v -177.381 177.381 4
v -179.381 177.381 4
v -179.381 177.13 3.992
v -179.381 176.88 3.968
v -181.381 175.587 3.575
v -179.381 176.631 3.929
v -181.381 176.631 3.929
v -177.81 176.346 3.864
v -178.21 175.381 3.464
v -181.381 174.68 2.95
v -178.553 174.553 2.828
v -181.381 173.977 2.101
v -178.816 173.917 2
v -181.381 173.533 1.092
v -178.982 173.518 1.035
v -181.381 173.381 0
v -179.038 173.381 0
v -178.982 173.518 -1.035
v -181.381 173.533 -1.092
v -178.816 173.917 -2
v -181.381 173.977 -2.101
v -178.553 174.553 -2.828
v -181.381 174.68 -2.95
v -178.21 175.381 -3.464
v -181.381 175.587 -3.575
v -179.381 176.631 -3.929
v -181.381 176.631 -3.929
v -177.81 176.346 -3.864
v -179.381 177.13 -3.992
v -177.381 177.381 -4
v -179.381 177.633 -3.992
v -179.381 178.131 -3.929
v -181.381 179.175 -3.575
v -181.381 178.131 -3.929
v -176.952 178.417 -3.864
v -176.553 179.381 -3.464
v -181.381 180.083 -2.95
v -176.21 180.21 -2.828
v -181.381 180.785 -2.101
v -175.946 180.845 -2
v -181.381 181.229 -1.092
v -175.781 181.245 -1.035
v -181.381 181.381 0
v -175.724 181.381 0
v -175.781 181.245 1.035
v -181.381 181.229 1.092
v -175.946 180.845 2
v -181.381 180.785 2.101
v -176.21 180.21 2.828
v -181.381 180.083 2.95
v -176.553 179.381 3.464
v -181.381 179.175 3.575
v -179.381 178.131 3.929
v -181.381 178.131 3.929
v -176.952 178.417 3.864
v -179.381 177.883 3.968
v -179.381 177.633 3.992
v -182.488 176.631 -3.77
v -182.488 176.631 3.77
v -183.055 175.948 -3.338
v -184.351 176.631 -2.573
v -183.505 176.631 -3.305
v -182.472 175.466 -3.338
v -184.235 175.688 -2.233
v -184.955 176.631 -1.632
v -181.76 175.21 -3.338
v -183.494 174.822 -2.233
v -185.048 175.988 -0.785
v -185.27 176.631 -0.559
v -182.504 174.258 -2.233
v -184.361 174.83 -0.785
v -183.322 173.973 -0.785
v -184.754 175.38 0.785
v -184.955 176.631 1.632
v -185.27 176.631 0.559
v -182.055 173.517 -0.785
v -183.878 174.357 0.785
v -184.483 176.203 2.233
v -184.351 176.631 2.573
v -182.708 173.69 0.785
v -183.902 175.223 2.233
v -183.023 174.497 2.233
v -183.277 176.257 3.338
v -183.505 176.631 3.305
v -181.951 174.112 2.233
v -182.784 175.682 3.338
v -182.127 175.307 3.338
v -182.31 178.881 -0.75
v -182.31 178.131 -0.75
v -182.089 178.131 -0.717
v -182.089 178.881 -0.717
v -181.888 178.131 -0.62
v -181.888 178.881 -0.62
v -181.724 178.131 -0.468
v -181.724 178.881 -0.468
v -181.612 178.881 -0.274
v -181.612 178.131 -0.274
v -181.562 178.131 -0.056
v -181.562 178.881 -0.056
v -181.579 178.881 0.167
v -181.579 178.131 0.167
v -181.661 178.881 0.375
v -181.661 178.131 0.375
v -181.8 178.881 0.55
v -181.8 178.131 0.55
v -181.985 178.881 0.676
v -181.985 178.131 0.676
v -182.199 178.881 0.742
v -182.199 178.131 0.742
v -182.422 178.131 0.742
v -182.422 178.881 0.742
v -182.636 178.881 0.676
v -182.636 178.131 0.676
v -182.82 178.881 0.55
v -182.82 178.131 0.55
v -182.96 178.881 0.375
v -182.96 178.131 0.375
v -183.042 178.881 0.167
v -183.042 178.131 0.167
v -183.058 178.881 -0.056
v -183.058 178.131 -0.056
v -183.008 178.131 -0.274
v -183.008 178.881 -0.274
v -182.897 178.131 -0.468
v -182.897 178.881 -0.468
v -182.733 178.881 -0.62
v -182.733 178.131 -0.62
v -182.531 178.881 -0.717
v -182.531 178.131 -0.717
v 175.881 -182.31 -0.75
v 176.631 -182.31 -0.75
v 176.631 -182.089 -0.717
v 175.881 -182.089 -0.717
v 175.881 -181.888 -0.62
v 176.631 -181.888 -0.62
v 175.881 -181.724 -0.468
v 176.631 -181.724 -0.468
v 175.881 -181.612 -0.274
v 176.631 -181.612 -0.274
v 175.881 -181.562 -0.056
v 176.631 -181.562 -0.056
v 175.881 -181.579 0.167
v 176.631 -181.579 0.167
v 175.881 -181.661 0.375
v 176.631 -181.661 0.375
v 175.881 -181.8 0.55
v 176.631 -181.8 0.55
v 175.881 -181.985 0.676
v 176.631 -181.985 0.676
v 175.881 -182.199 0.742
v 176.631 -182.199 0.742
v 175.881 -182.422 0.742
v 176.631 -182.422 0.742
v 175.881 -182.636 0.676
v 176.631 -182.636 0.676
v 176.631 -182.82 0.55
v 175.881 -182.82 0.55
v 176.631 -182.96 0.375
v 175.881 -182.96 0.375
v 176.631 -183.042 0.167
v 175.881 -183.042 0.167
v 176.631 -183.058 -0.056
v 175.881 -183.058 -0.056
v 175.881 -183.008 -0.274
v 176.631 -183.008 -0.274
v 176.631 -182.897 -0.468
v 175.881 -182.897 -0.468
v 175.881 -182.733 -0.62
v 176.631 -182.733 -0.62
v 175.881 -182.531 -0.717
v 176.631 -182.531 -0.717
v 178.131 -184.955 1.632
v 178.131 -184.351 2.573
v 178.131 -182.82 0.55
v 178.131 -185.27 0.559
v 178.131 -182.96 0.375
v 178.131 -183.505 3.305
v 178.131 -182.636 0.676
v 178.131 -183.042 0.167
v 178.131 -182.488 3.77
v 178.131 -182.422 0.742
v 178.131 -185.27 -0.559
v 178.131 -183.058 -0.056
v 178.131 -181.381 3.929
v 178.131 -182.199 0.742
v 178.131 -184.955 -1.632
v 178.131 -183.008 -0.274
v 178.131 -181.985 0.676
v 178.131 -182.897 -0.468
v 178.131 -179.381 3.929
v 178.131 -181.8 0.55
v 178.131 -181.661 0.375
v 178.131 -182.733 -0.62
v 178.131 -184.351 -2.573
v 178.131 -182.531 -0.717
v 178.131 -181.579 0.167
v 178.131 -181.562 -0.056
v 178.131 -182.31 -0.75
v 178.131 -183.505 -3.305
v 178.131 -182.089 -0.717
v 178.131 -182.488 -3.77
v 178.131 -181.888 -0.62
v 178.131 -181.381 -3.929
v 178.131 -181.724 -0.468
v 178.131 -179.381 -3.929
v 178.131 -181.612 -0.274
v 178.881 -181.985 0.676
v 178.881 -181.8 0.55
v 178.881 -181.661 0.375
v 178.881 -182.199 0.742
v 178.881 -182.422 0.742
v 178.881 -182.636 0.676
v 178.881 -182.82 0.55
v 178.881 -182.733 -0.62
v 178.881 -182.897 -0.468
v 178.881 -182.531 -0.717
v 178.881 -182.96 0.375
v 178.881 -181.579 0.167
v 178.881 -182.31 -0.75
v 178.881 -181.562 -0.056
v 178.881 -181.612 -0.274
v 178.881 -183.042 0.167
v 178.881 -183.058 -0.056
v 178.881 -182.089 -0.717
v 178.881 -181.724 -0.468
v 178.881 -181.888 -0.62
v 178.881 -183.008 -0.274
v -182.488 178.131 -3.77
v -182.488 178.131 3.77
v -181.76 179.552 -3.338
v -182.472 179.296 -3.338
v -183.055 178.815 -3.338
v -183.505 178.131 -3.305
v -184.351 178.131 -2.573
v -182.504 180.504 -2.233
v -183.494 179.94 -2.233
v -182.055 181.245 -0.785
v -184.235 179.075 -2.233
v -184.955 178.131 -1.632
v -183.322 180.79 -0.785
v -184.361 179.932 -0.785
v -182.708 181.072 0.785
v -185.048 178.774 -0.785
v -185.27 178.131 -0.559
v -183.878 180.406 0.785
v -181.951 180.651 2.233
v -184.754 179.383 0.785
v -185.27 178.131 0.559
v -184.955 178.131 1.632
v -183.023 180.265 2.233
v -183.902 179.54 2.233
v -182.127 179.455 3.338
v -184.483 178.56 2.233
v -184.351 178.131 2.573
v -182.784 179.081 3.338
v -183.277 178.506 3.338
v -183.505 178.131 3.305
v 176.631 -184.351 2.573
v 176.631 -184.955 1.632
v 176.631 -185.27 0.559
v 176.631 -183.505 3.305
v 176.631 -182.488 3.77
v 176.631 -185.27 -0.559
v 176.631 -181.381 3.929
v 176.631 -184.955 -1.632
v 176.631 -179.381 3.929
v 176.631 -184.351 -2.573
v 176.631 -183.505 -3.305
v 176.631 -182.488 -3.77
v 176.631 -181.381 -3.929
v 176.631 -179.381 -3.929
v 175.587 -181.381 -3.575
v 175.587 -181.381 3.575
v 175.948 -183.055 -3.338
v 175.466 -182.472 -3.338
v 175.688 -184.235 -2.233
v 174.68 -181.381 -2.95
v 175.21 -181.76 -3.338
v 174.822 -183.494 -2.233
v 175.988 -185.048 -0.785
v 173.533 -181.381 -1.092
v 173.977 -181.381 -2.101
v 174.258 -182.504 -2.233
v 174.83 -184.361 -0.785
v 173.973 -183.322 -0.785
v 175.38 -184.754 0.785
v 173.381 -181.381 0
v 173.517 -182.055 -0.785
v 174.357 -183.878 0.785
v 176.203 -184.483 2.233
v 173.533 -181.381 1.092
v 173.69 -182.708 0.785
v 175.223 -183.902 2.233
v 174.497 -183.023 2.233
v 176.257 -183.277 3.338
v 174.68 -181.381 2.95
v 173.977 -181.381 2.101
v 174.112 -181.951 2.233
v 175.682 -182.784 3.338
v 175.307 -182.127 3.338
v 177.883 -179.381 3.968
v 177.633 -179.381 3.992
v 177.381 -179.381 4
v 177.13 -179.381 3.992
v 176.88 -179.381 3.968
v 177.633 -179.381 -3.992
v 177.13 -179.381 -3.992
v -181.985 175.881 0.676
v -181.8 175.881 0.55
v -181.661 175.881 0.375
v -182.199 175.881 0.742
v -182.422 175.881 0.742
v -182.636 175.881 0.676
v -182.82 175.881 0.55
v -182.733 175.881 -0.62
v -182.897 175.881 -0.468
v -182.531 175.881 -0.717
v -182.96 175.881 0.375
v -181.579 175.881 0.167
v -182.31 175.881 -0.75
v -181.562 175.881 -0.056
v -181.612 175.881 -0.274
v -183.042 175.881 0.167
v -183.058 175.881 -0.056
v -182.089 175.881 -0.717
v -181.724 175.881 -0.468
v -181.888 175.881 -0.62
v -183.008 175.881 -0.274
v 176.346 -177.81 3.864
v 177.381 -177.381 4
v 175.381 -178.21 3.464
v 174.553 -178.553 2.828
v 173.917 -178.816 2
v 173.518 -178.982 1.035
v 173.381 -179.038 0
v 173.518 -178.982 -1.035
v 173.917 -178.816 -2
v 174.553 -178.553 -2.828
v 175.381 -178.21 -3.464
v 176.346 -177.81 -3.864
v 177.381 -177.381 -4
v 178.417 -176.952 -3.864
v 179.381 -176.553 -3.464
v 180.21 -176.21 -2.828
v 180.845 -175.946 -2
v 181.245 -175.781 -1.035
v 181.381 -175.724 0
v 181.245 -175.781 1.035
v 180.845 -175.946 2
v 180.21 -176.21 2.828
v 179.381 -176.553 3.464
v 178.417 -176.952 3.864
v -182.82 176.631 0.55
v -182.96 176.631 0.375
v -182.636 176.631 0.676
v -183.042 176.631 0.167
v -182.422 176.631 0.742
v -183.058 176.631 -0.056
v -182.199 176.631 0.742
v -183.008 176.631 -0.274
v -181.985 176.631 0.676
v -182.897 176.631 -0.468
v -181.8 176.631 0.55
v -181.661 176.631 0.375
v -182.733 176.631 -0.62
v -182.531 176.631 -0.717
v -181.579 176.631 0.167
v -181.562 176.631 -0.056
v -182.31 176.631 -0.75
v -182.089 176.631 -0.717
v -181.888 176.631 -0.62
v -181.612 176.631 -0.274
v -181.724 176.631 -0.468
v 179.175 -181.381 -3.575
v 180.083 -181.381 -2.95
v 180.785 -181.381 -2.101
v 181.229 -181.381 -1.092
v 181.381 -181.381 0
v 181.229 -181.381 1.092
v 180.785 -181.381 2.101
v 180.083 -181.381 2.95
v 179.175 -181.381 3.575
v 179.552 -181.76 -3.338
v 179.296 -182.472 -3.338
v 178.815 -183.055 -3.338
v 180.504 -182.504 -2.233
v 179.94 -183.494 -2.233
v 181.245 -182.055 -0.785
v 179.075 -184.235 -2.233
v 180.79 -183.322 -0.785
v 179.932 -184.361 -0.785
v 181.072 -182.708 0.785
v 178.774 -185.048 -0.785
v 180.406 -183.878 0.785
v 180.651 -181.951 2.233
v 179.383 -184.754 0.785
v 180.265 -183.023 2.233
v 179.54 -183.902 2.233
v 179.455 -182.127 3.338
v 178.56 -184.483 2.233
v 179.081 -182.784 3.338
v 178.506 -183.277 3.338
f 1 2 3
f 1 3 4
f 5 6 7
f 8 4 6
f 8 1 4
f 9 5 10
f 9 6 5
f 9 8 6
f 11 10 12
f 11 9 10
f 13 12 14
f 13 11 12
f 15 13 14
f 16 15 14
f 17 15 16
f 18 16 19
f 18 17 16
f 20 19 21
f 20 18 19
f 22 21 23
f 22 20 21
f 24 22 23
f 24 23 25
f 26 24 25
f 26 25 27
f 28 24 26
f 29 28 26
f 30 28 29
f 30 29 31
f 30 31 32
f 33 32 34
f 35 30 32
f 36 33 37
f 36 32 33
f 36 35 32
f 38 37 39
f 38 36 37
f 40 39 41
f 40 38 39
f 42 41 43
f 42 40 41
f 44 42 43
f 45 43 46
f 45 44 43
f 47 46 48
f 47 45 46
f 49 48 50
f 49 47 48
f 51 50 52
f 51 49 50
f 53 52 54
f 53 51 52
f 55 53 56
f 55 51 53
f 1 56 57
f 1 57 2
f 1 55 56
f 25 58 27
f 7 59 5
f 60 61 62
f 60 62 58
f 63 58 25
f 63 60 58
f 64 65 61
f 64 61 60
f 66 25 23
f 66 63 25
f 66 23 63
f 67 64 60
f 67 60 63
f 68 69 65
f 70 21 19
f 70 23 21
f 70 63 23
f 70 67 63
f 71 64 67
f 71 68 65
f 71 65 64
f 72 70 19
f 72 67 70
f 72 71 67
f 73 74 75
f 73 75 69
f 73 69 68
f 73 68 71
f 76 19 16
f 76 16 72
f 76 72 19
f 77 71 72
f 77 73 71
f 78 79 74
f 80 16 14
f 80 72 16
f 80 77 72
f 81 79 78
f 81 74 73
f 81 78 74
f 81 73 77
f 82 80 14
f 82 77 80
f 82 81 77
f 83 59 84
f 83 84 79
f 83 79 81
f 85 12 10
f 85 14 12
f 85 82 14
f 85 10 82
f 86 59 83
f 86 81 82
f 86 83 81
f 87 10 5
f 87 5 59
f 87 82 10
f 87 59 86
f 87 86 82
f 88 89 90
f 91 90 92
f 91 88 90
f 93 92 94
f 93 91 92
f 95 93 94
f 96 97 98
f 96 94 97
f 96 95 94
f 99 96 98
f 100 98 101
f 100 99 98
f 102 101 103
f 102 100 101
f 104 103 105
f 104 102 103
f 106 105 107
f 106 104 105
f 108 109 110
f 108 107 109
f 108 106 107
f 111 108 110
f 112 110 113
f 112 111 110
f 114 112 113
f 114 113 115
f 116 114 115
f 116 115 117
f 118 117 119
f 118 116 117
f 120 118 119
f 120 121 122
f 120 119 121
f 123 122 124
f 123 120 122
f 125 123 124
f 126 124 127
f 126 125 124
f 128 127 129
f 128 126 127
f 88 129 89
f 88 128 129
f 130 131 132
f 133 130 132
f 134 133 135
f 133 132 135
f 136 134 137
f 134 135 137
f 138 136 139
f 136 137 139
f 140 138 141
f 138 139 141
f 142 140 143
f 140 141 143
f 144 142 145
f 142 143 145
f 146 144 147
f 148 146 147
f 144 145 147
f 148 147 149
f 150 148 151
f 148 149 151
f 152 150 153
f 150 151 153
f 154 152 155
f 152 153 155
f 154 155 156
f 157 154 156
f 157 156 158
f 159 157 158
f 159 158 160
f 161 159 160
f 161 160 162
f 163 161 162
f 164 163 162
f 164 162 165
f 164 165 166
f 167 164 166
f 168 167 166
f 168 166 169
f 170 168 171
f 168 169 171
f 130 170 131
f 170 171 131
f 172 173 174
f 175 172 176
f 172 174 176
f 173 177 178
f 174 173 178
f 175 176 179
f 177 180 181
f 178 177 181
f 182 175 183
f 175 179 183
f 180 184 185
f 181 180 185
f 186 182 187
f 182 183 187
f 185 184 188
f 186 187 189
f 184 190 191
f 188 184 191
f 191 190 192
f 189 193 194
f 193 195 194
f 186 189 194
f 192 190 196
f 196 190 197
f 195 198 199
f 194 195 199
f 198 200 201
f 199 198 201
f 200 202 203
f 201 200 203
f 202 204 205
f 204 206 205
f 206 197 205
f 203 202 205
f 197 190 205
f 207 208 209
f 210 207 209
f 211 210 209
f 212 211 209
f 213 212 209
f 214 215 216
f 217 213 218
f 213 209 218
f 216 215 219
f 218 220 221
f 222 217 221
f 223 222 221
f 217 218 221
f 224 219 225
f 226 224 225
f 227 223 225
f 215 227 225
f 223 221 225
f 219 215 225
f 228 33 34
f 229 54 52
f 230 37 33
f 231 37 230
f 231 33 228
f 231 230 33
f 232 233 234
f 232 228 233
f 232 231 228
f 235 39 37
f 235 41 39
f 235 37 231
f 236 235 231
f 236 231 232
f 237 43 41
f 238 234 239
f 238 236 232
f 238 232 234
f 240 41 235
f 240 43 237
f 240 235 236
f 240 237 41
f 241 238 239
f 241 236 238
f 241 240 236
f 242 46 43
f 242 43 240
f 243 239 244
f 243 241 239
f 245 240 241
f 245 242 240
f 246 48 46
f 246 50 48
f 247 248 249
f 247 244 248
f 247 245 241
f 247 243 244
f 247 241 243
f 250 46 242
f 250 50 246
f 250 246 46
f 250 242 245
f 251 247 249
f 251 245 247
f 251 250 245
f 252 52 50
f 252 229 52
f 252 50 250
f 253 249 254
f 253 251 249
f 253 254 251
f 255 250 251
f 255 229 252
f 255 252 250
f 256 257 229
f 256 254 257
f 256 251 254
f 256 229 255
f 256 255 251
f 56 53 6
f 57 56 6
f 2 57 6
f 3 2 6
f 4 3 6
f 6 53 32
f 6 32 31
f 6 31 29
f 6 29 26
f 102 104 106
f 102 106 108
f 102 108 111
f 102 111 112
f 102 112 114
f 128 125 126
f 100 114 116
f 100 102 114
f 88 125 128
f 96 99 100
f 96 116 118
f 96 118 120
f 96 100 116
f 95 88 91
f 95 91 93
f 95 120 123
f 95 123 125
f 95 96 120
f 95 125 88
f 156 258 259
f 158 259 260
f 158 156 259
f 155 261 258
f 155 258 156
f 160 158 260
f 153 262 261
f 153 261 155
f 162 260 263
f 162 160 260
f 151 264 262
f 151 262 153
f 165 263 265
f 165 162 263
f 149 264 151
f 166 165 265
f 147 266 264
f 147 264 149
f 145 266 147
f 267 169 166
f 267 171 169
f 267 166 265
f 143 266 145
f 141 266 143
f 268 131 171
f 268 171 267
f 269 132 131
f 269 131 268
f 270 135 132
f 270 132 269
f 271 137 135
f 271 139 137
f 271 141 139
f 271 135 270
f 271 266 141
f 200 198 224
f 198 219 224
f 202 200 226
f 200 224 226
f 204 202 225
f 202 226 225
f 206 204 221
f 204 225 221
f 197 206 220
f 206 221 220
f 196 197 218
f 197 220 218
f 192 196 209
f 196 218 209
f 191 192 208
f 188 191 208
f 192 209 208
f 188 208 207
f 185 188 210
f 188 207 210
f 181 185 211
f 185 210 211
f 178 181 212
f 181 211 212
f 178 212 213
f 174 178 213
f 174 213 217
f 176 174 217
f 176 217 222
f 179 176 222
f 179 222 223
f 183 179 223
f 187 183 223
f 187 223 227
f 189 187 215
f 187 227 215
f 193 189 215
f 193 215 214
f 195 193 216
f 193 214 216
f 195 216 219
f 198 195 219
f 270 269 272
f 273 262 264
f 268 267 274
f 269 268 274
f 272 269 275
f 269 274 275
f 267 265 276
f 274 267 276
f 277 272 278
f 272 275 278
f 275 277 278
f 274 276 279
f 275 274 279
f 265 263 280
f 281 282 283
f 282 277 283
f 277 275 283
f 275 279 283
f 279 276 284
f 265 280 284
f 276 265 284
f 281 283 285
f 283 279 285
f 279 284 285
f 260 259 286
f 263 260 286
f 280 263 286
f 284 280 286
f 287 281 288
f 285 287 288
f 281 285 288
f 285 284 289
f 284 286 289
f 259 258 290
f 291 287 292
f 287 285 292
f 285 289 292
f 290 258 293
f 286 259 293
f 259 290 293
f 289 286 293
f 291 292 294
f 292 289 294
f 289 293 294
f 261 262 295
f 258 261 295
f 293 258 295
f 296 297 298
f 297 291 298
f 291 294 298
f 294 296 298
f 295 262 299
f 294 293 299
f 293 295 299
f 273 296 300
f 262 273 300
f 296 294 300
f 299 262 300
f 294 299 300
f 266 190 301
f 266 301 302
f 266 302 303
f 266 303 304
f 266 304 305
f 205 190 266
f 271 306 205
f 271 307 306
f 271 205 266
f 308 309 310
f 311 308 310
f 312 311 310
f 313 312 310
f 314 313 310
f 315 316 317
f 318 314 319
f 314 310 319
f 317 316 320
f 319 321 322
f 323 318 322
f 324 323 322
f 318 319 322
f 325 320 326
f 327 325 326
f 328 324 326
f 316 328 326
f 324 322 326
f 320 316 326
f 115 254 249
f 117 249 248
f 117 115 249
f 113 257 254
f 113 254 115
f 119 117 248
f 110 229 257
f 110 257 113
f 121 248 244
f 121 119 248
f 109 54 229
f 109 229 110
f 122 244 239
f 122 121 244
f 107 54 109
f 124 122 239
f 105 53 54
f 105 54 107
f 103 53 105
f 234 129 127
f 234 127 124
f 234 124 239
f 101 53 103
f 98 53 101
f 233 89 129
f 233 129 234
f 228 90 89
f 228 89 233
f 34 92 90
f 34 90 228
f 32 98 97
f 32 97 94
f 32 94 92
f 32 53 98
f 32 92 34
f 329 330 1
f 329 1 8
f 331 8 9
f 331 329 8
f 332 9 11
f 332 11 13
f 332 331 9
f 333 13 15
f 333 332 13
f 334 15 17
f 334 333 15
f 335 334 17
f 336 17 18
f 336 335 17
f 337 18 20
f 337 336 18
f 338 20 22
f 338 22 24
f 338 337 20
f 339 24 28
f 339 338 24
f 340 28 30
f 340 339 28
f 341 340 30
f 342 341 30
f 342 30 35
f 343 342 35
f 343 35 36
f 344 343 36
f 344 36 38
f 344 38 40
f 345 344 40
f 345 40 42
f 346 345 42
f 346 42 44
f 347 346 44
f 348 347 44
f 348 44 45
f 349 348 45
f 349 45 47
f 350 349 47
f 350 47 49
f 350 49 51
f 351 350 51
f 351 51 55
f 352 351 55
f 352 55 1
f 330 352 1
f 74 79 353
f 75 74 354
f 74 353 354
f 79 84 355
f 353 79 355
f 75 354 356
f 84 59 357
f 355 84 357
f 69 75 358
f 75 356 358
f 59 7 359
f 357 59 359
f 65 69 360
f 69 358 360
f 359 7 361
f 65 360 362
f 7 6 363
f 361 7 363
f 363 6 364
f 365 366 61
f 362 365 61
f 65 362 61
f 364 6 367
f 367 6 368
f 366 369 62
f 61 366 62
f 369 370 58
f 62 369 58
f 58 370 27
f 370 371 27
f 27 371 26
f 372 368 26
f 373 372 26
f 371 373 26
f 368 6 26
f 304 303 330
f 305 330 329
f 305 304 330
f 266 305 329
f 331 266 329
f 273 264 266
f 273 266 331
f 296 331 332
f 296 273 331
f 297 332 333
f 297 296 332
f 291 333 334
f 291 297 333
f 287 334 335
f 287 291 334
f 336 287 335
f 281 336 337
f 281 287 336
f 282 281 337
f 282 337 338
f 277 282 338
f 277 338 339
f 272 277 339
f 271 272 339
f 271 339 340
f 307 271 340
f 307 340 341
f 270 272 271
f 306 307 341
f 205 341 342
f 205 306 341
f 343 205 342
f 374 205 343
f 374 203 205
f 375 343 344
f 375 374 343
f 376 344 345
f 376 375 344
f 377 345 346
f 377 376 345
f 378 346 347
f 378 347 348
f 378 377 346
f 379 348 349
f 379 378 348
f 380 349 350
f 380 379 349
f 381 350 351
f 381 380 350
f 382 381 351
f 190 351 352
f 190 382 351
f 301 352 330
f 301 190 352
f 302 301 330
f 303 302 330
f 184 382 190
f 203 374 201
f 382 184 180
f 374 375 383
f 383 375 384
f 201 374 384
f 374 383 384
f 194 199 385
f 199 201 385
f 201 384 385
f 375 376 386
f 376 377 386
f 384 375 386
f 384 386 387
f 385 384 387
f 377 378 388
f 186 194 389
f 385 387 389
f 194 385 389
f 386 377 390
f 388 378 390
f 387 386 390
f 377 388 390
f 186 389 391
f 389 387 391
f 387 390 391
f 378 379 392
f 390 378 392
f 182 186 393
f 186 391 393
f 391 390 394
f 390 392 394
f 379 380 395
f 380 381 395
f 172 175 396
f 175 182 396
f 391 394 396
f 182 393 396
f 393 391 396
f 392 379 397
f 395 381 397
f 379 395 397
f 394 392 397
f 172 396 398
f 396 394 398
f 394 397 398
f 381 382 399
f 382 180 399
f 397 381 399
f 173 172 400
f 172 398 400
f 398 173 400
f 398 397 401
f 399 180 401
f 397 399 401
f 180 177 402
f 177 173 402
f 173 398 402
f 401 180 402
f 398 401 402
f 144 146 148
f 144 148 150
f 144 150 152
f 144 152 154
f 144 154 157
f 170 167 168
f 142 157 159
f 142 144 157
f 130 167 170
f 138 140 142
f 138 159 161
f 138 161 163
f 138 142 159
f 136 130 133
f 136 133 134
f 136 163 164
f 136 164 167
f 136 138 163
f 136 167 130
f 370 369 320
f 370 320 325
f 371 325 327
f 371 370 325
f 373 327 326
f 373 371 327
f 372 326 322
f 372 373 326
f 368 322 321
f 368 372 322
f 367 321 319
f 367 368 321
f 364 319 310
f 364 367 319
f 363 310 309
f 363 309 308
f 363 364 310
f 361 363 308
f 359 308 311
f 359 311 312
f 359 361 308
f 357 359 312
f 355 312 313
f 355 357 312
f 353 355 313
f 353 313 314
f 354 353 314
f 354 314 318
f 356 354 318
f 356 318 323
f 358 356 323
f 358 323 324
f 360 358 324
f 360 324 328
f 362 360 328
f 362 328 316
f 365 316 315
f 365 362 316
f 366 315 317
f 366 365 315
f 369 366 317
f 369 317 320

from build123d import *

# Parameters (mm, degrees)
SKETCH2_R          = 4
REVOLVE7_ANGLE     = 180
CUT_EXTRUDE1_START = -2
SKETCH6_W          = 1.5
SKETCH6_H          = 8
CUT_EXTRUDE1_DEPTH = 12
SKETCH8_R          = 0.75
CUT_EXTRUDE2_DEPTH = 1.5


with BuildPart() as part:
    # Sweep1: sweep along a path in Sketch1
    with BuildLine(Plane.XY) as sweep1_path:
        Line((-181.381279793, 177.381279793), (-177.381279793, 177.381279793))
        Line((-177.381279793, 177.381279793), (177.381279793, -177.381279793))
        Line((177.381279793, -177.381279793), (177.381279793, -181.381279793))
    # Sketch2 → Sweep1 (sweep)
    with BuildSketch(Plane(origin=(0, 0, 0), x_dir=(0, 0, 1), z_dir=(-0.707106781, 0.707106781, 0))):
        Circle(SKETCH2_R)
    sweep(path=sweep1_path.line, transition=Transition.RIGHT)

    # Sketch4 → Revolve7 (revolve)
    with BuildSketch(Plane.XZ.offset(181.381279793)):
        with BuildLine():
            Line((177.381279793, 4), (177.381279793, -4))
            ThreePointArc((177.381279793, -4), (181.381279793, 0), (177.381279793, 4))
        make_face()
    revolve7 = revolve(axis=Axis((177.381279793, -181.381279793, 4), (0, 0, -1)), revolution_arc=REVOLVE7_ANGLE)

    # Sketch6 → Cut-Extrude1 (cut)
    with BuildSketch(Plane(origin=(0, -181.381279793, 0), x_dir=(-1, 0, 0), z_dir=(0, -1, 0)).offset(CUT_EXTRUDE1_START)):
        with Locations((-177.381279793, 0)):
            Rectangle(SKETCH6_W, SKETCH6_H)
    cut_extrude1 = extrude(amount=CUT_EXTRUDE1_DEPTH, mode=Mode.SUBTRACT)

    # Sketch8 → Cut-Extrude2 (cut, symmetric)
    with BuildSketch(Plane(origin=(177.381279793, 0, 0), x_dir=(0, 0, -1), z_dir=(1, 0, 0))):
        with Locations((0, -182.310338204)):
            Circle(SKETCH8_R)
    cut_extrude2 = extrude(amount=CUT_EXTRUDE2_DEPTH, both=True, mode=Mode.SUBTRACT)

    # Mirror1: Revolve7, Cut-Extrude1, Cut-Extrude2 across plane
    add(revolve7.mirror(Plane(origin=(0, 0, 0), x_dir=(0, 0, 1), z_dir=(-0.707106781, 0.707106781, 0))))
    add(cut_extrude1.mirror(Plane(origin=(0, 0, 0), x_dir=(0, 0, 1), z_dir=(-0.707106781, 0.707106781, 0))), mode=Mode.SUBTRACT)
    add(cut_extrude2.mirror(Plane(origin=(0, 0, 0), x_dir=(0, 0, 1), z_dir=(-0.707106781, 0.707106781, 0))), mode=Mode.SUBTRACT)


solid = part.part
